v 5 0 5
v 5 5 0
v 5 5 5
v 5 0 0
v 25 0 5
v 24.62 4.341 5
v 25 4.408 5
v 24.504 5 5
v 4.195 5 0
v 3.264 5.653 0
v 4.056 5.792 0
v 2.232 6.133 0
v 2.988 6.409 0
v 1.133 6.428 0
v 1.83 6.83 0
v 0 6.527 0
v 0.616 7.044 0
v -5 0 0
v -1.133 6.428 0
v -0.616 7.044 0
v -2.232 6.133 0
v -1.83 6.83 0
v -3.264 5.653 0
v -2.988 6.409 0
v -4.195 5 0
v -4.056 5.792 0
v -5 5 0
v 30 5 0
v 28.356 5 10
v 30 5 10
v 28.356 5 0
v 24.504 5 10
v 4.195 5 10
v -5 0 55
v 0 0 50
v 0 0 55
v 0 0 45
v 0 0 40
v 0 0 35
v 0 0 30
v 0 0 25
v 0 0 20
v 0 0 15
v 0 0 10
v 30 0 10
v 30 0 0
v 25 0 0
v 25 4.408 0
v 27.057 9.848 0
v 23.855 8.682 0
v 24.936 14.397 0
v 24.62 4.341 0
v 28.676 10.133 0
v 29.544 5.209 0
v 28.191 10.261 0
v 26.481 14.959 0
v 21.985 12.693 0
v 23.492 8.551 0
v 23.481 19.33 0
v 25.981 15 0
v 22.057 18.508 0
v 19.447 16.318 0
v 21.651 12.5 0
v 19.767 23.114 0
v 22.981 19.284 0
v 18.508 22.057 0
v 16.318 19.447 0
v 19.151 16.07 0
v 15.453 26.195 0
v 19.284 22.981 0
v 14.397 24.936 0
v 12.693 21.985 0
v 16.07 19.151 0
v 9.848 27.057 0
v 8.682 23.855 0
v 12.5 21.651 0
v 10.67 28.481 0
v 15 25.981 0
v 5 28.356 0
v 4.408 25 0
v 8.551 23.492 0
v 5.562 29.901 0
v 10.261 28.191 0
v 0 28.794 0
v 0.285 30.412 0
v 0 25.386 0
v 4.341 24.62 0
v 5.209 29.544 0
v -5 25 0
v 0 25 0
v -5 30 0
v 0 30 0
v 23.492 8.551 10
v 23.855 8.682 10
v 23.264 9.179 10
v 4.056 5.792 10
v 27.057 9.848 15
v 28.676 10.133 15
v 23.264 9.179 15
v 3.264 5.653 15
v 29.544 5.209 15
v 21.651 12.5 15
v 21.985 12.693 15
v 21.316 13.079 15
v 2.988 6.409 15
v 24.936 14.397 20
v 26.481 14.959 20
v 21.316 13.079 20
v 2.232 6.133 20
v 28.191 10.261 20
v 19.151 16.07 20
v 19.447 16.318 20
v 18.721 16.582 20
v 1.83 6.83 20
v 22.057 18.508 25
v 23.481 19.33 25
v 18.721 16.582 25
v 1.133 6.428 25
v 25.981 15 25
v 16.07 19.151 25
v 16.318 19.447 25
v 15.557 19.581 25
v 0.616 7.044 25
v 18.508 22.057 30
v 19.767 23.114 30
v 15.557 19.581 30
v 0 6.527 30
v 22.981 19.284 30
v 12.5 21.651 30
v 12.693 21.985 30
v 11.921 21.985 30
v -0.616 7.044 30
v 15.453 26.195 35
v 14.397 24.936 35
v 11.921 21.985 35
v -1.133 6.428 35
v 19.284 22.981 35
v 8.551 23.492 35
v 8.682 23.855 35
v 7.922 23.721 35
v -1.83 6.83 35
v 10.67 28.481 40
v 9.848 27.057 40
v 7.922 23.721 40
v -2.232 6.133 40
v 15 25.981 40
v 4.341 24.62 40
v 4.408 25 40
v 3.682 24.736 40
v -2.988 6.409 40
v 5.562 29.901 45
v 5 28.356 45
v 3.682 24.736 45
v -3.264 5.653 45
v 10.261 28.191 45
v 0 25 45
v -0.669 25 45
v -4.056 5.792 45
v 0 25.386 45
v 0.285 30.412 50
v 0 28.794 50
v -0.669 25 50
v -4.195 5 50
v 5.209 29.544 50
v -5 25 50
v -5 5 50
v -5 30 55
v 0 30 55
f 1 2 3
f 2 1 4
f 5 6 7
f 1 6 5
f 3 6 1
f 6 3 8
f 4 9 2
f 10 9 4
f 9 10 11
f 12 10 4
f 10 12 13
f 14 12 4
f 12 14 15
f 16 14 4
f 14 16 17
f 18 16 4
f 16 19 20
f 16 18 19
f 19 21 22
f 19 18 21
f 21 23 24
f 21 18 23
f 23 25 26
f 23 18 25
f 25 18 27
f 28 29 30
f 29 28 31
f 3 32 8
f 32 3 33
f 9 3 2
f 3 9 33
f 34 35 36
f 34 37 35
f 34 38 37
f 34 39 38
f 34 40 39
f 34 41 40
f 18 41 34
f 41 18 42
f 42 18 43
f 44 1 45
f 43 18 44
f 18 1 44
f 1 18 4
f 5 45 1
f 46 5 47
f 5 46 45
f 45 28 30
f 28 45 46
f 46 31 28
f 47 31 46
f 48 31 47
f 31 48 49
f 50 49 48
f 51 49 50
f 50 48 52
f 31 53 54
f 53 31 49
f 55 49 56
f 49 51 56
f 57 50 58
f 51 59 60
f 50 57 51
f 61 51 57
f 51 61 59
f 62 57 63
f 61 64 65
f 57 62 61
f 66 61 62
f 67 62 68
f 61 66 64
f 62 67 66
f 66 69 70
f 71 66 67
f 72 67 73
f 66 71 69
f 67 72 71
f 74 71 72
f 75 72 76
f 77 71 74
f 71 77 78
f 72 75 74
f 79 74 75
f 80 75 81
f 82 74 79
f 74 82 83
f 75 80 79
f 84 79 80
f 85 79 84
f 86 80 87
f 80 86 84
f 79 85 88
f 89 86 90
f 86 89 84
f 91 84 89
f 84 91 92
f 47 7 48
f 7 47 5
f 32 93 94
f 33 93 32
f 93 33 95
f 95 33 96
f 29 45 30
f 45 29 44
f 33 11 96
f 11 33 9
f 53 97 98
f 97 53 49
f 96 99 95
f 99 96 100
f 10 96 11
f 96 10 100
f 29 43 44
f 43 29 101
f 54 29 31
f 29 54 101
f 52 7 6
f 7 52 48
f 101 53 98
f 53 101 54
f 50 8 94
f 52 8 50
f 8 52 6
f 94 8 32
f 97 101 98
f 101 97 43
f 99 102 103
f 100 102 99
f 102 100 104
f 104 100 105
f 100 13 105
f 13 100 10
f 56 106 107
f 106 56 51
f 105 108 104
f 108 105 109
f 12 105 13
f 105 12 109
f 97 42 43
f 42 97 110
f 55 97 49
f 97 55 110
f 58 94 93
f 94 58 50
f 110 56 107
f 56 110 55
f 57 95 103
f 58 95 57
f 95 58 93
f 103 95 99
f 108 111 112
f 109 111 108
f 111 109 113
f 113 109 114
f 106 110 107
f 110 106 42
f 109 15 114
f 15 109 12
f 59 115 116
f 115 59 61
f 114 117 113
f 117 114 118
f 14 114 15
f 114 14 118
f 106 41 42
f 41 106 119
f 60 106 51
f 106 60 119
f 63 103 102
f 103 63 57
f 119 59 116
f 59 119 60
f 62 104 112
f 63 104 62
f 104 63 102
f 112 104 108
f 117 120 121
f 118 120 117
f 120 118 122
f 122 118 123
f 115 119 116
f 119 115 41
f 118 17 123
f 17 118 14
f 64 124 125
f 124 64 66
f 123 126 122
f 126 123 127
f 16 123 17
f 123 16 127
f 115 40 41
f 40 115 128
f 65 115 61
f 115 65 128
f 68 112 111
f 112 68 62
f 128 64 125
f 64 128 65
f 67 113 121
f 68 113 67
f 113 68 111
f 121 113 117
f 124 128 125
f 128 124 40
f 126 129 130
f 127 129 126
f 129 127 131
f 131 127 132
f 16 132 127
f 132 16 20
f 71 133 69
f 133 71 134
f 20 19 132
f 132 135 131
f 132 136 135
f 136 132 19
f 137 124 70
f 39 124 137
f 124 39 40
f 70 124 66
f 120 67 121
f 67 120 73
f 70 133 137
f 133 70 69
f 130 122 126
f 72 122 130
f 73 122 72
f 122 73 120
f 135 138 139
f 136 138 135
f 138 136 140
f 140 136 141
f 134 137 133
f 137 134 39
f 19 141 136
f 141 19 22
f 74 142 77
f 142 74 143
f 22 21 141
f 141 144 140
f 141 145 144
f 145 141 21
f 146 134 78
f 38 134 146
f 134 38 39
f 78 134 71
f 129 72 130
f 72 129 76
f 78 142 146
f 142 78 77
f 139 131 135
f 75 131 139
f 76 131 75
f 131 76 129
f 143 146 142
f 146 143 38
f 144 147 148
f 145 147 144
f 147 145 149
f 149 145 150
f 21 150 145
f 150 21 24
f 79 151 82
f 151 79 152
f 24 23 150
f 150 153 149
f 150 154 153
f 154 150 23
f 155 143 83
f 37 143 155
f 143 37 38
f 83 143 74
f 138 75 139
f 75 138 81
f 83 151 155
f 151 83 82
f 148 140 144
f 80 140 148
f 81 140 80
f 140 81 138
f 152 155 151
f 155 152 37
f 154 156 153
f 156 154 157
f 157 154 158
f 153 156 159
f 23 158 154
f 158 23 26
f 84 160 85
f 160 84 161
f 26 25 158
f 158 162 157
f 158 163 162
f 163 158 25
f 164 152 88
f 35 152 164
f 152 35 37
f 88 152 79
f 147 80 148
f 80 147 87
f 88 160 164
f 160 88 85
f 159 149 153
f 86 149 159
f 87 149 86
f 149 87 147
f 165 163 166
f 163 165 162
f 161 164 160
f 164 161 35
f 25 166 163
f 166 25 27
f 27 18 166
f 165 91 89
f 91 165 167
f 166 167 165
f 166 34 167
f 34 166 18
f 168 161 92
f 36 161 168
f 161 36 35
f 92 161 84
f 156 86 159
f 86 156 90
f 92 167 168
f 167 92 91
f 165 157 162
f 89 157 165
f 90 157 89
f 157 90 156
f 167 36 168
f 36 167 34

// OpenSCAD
width = 5;

module bridge(height, length) {
	cube([width, width, height]);
	translate([width + length, 0, 0]) {
		cube([width, width, height]);
	}
	translate([0, 0, height]) {
		cube([width + length + width, width, width]);
	}
}

h = 5;
anglestep = 10;
for(a = [0:anglestep:90]) {
	rotate([0,0,a]) {
		bridge(h, 20);
	}
	h = h + a / anglestep * width;
}
